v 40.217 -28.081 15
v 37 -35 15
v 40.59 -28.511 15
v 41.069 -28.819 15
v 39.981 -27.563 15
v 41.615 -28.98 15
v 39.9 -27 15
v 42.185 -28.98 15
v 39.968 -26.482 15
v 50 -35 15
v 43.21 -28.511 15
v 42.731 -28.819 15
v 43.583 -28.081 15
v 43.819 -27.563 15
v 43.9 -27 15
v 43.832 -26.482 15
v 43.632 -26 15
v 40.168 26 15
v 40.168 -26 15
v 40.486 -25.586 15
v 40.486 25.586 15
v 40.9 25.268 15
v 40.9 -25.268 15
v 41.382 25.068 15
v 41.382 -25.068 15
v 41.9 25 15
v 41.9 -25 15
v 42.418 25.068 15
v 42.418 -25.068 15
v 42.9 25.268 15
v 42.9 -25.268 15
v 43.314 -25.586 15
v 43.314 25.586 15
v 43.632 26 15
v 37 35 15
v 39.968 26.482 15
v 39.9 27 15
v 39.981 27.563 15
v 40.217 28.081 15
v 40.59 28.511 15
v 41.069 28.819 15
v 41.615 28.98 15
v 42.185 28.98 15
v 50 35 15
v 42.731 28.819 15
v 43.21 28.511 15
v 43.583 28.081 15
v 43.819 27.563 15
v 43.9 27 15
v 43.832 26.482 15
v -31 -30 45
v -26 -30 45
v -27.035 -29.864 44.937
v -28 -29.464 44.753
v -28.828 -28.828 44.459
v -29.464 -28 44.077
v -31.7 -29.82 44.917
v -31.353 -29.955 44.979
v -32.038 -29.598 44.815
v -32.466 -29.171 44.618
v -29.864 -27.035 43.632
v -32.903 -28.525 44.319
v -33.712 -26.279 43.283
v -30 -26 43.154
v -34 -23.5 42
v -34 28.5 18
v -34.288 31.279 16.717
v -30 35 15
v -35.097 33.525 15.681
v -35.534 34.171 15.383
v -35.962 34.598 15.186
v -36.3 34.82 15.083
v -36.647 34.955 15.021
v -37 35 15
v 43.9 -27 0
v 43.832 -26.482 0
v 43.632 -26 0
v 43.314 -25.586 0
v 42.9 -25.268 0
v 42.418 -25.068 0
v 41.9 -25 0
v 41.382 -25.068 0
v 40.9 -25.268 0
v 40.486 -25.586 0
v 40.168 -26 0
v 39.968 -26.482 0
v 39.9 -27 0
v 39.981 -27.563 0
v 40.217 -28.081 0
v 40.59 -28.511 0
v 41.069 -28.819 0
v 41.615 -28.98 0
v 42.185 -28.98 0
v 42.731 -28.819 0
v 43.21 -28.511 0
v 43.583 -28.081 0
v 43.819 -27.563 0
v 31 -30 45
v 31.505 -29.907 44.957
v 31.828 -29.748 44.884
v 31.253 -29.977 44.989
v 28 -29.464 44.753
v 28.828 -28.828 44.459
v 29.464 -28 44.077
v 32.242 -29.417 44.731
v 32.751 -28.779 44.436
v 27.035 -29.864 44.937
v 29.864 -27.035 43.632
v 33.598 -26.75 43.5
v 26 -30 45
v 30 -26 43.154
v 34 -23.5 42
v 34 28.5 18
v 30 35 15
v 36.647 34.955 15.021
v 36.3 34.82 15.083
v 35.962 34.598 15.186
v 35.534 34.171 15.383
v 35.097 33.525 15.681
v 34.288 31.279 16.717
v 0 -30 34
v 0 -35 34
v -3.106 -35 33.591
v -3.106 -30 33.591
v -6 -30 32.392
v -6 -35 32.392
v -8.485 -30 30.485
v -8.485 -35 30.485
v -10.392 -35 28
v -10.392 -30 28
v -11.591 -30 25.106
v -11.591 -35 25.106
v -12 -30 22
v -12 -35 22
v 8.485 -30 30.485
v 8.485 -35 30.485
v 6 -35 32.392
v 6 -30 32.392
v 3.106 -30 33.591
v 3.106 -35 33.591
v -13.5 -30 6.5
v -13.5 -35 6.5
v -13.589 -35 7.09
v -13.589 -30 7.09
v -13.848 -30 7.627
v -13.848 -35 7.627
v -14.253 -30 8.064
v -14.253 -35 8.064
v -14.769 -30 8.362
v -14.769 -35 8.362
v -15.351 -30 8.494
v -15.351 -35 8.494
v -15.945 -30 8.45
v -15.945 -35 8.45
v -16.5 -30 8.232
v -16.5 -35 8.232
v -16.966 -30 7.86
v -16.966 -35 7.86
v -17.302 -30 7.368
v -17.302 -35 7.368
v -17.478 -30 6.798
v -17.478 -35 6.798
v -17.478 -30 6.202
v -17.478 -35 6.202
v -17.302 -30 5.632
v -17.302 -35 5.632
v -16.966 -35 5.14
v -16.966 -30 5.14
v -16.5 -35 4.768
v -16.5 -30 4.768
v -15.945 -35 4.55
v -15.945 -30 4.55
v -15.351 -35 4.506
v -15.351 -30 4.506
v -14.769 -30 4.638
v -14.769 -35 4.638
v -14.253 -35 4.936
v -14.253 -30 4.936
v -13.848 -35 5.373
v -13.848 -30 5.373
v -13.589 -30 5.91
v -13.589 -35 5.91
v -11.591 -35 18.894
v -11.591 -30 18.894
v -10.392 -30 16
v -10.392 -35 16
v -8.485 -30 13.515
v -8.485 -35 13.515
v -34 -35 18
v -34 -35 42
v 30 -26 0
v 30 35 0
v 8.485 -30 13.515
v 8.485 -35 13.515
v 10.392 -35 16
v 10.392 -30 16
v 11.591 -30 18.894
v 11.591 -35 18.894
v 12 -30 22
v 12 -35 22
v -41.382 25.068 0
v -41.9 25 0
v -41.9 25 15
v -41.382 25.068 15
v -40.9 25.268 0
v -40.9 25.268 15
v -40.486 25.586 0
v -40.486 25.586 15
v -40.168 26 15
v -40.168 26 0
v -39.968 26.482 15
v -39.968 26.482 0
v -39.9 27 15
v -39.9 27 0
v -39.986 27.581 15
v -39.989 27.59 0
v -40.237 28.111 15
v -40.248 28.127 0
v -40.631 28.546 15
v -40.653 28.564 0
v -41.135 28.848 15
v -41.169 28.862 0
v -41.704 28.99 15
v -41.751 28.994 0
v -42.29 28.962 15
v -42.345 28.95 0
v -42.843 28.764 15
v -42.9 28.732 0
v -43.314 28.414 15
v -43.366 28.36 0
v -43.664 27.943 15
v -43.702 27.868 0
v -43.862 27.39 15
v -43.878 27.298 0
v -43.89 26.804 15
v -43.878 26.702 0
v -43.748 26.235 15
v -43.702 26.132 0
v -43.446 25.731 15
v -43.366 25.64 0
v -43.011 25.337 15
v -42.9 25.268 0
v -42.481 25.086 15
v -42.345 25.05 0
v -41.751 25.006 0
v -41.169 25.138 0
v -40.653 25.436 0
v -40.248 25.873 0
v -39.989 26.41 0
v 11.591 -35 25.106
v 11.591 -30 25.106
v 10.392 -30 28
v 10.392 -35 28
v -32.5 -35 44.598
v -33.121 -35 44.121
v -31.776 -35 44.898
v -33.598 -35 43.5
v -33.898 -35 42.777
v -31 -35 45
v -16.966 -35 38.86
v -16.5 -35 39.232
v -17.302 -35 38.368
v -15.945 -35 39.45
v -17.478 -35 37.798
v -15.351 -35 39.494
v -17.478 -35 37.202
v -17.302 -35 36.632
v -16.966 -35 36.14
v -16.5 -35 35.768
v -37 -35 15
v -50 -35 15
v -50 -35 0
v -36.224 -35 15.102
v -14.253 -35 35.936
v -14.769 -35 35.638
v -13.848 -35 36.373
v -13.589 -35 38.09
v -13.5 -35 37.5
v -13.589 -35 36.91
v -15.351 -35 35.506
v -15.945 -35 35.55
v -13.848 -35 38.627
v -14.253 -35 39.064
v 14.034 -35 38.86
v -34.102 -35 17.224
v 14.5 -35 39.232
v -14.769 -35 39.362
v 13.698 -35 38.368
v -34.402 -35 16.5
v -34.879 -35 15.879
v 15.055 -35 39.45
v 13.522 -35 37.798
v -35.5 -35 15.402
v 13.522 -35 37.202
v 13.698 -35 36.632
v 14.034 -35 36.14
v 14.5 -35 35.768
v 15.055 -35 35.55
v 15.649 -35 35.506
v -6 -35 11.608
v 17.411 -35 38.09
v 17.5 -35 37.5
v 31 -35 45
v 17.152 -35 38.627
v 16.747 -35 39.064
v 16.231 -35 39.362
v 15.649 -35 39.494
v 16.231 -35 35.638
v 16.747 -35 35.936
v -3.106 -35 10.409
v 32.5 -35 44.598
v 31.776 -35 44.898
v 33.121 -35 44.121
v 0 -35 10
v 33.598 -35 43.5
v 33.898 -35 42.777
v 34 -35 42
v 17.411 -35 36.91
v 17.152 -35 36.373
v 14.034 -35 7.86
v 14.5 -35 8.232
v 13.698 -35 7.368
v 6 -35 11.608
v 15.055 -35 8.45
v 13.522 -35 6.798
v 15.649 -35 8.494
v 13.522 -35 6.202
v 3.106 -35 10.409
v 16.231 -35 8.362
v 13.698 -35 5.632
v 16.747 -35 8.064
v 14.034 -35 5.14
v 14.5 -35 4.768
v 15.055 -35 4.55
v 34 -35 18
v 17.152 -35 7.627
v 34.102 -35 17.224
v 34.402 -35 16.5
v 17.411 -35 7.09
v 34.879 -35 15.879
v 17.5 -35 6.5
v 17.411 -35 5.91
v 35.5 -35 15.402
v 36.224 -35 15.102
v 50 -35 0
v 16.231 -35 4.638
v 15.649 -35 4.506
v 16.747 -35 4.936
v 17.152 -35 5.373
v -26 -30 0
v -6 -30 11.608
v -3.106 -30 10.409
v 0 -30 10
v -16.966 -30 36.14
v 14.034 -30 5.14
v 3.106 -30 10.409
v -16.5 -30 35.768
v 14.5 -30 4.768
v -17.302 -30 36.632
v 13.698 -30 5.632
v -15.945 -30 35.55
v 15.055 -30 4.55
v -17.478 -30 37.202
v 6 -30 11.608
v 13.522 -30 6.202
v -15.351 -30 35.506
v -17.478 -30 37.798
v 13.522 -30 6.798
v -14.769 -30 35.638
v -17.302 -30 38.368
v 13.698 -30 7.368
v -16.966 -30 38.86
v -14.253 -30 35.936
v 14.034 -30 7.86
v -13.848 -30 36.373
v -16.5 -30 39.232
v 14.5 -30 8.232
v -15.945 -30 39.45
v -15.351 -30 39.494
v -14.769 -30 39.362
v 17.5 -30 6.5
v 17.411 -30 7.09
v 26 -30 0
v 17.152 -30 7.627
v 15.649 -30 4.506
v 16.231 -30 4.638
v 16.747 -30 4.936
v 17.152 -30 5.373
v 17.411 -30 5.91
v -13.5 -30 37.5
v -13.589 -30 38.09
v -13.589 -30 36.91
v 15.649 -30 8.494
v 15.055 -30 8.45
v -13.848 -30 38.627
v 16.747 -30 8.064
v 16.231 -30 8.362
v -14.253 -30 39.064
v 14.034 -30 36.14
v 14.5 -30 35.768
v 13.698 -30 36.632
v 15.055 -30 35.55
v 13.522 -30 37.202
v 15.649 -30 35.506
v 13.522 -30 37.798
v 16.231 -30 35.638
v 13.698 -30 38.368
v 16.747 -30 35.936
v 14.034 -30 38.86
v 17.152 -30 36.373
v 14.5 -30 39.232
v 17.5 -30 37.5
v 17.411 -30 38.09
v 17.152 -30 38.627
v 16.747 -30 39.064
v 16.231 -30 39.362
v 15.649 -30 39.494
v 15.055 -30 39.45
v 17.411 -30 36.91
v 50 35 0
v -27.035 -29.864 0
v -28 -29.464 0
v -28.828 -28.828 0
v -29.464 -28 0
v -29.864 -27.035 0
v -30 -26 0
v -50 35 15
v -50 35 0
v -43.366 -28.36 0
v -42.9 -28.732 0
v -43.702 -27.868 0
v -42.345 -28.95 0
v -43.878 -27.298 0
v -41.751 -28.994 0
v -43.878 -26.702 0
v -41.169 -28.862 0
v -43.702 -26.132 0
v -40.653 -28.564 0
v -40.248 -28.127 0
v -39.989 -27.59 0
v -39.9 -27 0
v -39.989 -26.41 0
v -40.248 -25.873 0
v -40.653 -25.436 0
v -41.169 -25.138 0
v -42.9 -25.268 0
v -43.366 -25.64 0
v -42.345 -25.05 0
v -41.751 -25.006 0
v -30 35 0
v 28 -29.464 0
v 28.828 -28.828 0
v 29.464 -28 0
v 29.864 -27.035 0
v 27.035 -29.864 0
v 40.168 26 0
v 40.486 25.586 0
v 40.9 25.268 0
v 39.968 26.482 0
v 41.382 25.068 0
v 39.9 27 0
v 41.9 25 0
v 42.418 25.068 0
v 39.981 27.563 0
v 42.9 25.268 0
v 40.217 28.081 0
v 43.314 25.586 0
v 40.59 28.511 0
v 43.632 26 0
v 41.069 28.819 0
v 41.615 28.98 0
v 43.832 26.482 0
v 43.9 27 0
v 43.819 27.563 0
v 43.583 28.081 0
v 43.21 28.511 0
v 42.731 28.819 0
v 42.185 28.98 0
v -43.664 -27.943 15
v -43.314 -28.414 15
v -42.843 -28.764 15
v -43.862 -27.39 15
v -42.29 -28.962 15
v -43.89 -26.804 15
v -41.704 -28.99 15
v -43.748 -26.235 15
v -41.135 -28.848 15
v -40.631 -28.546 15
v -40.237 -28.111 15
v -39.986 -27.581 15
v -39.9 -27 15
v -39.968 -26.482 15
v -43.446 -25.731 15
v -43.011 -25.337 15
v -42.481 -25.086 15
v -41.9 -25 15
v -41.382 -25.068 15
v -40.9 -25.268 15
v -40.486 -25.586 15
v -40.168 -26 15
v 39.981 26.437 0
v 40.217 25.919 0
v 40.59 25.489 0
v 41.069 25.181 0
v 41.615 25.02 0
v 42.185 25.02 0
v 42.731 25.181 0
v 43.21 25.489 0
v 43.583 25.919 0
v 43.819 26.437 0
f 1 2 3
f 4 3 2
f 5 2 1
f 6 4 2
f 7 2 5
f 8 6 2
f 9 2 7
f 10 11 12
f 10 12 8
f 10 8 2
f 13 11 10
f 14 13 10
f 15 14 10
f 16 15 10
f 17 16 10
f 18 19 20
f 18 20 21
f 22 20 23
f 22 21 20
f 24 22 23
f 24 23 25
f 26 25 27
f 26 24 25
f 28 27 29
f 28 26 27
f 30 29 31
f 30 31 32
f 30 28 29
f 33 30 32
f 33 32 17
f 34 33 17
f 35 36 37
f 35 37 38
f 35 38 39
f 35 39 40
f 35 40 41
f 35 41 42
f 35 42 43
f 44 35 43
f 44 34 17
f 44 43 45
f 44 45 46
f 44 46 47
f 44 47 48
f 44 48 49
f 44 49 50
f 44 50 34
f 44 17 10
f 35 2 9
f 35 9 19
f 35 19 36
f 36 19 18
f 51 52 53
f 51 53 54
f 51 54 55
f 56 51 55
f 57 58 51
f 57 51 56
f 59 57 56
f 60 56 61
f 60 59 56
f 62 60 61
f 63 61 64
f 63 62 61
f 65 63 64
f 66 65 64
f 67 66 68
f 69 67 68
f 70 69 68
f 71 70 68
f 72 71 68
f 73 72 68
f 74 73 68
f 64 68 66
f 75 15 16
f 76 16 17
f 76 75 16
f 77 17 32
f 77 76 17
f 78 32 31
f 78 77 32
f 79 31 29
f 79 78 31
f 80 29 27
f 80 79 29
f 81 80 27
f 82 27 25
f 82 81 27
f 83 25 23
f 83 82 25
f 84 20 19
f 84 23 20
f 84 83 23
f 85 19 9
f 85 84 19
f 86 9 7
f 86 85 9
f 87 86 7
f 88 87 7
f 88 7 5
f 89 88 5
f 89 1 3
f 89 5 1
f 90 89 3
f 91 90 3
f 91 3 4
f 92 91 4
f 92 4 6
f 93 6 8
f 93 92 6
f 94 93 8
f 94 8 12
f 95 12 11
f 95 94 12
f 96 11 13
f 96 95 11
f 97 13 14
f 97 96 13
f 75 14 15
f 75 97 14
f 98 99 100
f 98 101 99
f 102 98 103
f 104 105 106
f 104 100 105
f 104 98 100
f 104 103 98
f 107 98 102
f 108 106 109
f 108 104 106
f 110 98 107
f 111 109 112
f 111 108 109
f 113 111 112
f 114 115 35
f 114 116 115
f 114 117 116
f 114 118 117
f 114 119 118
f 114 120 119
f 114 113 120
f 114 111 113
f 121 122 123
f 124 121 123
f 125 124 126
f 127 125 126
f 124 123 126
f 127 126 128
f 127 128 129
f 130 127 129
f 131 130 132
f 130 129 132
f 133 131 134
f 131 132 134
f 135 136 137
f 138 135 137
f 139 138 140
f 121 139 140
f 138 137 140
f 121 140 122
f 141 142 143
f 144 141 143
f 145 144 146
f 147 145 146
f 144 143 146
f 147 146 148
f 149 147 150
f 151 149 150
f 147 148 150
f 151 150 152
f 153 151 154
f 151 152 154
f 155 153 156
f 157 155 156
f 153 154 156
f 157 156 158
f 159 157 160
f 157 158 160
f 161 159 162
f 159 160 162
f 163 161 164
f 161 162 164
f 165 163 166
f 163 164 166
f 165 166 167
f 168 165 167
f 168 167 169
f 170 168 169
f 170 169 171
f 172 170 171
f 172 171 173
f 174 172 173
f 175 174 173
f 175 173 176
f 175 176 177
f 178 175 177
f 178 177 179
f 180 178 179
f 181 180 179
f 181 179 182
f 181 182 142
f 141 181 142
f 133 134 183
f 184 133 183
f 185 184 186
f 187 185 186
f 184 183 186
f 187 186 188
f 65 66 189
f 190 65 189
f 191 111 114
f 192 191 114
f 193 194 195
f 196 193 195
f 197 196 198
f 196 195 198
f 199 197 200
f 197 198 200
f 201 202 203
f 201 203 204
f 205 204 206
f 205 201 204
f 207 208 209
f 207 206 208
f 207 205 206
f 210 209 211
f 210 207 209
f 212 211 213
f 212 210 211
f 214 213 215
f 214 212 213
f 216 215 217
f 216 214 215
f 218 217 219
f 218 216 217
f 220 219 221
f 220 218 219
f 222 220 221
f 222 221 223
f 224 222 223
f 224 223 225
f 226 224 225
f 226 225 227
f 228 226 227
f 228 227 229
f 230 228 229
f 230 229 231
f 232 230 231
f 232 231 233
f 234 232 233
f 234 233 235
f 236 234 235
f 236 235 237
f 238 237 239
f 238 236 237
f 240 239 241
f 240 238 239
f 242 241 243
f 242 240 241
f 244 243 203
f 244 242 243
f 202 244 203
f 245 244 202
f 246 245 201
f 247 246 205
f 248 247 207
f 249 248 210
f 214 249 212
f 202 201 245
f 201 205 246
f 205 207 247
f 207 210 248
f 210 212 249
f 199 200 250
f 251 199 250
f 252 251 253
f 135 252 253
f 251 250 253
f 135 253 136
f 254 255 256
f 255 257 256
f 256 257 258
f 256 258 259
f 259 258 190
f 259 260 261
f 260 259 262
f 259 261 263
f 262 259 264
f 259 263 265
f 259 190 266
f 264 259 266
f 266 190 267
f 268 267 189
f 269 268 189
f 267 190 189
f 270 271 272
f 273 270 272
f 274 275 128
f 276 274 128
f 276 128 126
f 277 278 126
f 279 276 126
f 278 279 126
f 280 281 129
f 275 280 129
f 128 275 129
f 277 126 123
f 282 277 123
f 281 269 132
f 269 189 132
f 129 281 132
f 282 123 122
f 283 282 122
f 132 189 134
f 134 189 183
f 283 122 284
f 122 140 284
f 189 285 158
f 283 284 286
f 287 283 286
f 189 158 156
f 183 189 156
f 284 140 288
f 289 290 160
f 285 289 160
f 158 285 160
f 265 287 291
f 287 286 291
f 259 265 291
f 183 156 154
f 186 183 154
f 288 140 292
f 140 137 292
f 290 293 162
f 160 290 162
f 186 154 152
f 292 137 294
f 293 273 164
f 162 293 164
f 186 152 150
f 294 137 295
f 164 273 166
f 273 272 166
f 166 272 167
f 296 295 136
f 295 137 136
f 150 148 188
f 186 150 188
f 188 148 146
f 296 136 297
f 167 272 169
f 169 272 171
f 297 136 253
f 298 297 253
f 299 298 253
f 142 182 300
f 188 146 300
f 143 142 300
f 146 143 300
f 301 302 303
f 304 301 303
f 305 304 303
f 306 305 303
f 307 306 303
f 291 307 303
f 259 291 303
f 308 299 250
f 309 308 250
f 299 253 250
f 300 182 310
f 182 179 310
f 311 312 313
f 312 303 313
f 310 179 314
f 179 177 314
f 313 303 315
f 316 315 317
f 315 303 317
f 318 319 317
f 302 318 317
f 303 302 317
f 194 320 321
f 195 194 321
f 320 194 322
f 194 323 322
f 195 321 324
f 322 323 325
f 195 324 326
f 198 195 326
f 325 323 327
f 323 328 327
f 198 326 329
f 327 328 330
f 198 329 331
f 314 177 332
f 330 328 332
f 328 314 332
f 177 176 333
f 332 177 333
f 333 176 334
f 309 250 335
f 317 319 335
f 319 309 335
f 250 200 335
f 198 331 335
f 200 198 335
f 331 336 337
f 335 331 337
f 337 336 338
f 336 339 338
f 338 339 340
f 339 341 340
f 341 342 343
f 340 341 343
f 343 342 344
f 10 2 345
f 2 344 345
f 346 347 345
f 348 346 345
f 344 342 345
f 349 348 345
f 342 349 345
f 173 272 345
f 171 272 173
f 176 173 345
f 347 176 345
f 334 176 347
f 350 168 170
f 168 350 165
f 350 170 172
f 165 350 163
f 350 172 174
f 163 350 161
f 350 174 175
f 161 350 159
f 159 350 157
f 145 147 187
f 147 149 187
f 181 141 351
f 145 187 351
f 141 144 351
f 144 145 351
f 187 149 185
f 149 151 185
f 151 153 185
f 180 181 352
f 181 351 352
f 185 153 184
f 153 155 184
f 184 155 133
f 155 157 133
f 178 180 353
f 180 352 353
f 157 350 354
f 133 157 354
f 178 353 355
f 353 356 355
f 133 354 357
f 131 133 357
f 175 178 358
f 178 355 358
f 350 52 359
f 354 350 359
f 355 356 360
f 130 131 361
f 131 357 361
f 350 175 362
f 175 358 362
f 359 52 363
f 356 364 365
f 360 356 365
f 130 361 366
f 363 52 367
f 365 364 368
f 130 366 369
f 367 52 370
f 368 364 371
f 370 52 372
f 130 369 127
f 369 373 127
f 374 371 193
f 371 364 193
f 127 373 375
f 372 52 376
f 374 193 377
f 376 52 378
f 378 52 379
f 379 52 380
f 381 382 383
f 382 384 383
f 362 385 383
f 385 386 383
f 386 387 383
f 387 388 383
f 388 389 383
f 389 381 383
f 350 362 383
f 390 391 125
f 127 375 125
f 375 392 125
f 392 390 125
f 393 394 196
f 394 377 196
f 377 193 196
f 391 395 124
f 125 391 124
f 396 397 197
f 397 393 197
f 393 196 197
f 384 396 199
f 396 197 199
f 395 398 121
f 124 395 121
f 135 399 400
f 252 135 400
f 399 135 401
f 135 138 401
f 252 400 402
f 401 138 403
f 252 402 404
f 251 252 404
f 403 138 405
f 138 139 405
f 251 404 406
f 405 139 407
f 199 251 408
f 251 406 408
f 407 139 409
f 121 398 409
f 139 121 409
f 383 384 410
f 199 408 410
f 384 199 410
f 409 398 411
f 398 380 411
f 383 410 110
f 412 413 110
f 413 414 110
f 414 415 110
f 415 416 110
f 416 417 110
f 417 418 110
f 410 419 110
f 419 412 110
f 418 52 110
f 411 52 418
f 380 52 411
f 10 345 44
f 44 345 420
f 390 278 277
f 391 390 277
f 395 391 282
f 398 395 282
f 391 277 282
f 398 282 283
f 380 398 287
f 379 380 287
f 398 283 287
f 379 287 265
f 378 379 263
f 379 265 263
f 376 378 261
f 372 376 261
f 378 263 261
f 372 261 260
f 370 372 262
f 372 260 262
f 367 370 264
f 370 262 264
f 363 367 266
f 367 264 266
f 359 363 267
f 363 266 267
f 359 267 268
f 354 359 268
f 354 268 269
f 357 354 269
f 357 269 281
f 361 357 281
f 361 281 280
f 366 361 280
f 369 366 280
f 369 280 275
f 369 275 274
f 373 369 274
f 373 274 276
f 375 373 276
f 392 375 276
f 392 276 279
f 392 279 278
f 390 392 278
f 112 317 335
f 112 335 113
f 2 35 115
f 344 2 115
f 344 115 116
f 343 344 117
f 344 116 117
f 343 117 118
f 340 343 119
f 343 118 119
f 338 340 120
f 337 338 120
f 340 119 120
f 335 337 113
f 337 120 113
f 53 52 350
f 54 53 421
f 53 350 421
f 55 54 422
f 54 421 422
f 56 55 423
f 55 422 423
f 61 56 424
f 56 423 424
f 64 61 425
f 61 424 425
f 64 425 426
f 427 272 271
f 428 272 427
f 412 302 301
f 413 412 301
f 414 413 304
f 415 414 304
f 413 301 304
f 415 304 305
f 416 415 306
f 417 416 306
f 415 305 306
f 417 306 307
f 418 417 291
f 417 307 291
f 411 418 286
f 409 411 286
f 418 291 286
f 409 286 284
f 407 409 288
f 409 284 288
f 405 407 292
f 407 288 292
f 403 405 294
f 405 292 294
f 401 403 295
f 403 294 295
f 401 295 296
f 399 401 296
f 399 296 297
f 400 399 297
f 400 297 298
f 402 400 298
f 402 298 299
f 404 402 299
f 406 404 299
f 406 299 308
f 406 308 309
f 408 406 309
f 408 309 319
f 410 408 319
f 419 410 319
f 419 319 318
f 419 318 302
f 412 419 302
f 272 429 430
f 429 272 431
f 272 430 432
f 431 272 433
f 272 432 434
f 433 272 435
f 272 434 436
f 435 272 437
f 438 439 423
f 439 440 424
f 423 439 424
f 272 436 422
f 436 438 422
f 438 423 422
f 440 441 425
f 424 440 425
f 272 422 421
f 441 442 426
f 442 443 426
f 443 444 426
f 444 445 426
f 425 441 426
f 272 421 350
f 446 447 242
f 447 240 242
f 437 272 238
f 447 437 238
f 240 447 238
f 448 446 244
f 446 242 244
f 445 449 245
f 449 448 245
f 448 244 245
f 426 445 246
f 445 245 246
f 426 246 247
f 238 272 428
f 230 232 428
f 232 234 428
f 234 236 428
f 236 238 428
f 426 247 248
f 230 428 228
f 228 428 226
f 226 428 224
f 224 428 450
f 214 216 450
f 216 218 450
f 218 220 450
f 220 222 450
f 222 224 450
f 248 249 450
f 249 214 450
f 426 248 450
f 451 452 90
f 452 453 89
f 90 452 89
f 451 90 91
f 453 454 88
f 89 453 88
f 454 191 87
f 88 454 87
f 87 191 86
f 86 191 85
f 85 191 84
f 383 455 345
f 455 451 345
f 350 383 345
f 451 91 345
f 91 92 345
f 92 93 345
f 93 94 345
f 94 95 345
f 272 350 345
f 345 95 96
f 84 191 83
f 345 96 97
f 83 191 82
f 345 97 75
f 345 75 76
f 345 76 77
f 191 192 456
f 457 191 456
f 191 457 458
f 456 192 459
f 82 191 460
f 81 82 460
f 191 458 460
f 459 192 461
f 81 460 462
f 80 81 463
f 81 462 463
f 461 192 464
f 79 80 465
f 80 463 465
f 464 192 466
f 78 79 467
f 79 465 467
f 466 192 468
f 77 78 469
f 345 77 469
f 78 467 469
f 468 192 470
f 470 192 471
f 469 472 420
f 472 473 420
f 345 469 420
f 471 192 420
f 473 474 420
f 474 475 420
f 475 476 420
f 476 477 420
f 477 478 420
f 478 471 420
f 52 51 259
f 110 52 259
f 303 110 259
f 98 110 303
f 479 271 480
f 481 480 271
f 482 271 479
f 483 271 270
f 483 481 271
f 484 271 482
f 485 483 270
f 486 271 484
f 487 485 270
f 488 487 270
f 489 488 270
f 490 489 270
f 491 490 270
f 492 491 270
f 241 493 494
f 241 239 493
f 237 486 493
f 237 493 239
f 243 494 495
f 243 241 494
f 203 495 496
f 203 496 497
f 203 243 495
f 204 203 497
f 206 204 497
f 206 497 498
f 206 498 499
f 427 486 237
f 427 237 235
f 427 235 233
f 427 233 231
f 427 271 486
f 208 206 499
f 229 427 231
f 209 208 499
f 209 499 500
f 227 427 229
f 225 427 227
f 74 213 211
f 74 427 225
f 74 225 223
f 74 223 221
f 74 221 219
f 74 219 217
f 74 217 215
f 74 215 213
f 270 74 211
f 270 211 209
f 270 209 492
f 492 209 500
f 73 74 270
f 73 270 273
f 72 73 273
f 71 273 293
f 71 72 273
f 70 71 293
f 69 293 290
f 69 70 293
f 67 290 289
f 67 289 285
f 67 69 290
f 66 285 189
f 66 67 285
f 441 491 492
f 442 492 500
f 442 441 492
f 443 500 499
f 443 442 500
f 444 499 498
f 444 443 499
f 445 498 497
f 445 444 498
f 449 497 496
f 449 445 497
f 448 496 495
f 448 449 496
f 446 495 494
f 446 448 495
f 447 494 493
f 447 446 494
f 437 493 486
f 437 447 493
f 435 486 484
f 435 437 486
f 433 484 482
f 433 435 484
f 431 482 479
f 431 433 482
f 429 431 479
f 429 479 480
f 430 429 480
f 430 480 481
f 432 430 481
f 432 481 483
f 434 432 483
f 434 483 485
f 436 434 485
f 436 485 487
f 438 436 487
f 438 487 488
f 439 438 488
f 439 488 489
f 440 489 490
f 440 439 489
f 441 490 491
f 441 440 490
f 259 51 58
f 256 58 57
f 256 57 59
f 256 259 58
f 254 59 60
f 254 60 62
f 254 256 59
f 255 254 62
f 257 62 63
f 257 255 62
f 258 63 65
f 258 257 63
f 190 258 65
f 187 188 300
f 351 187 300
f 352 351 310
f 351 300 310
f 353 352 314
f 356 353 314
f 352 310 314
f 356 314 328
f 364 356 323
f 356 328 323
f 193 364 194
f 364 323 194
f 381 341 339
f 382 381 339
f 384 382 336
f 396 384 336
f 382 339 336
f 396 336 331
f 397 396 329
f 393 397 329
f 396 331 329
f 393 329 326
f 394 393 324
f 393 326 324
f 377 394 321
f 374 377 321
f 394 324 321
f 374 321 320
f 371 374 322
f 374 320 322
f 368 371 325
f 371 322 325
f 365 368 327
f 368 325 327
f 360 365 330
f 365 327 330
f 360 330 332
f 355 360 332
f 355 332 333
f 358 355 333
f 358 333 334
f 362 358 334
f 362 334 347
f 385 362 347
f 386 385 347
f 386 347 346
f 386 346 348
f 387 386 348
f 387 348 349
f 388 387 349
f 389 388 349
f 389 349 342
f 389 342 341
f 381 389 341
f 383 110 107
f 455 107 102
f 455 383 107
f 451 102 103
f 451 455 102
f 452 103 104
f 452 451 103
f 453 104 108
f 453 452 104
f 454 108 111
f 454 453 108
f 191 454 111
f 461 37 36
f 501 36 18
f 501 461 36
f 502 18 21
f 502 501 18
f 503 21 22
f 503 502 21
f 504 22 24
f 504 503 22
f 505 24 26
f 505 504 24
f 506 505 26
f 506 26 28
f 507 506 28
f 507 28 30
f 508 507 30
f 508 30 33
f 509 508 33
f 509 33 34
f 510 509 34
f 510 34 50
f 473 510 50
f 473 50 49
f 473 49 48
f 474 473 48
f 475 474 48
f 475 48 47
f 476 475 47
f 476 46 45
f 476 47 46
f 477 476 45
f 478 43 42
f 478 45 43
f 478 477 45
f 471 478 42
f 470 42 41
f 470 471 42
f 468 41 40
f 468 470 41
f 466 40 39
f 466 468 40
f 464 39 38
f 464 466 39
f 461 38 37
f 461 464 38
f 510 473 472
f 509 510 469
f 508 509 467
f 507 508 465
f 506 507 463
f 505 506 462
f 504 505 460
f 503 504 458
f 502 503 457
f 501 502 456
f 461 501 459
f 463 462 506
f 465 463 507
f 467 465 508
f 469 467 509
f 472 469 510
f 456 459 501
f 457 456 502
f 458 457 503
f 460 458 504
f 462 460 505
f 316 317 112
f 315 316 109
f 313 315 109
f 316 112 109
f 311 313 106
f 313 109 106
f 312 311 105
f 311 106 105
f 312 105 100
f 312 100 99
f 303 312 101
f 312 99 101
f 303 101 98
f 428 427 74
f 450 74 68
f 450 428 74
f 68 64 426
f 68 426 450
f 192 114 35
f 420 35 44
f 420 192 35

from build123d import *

# Parameters (mm, degrees)
SKETCH_5_W          = 100
SKETCH_5_H          = 70
SKETCH_5_R          = 2
EXTRUDE_10_DEPTH    = 0.0001
SKETCH_6_W          = 60
SKETCH_6_H          = 5
EXTRUDE_11_DEPTH    = 45
SKETCH_7_W          = 4
SKETCH_7_H          = 70
EXTRUDE_12_DEPTH    = 45
CUT_EXTRUDE_1_DEPTH = 76
SKETCH_16_W         = 16
SKETCH_16_H         = 70
EXTRUDE_16_DEPTH    = 15
SKETCH_5_3_R        = 2
CUT_EXTRUDE_2_DEPTH = 49
SKETCH_17_R         = 2
SKETCH_17_R_2       = 12
CUT_EXTRUDE_5_DEPTH = 98.082485547
FILLET_1_R          = 3
SKETCH_18_W         = 60
SKETCH_18_H         = 65
CUT_EXTRUDE_6_DEPTH = 76.828754441
FILLET_2_R          = 4


with BuildPart() as part:
    # 草图5 → 凸台-拉伸10 (new body)
    with BuildSketch(Plane.XY):
        Rectangle(SKETCH_5_W, SKETCH_5_H)
        with Locations((-41.9, 27)):
            Circle(SKETCH_5_R, mode=Mode.SUBTRACT)
        with Locations((-41.9, -27)):
            Circle(SKETCH_5_R, mode=Mode.SUBTRACT)
        with Locations((41.9, -27)):
            Circle(SKETCH_5_R, mode=Mode.SUBTRACT)
        with Locations((41.9, 27)):
            Circle(SKETCH_5_R, mode=Mode.SUBTRACT)
    extrude(amount=EXTRUDE_10_DEPTH)

    # 草图6 → 凸台-拉伸11 (add)
    with BuildSketch(Plane.XY.offset(0.0001)):
        with Locations((0, -32.5)):
            Rectangle(SKETCH_6_W, SKETCH_6_H)
    extrude(amount=EXTRUDE_11_DEPTH)

    # 草图7 → 凸台-拉伸12 (add)
    with BuildSketch(Plane.XY.offset(0.0001)):
        with Locations((-32, 0)):
            Rectangle(SKETCH_7_W, SKETCH_7_H)
        with Locations((32, 0)):
            Rectangle(SKETCH_7_W, SKETCH_7_H)
    extrude(amount=EXTRUDE_12_DEPTH)

    # 草图8 → 切除-拉伸1 (cut)
    with BuildSketch(Plane.ZY.offset(34)):
        Polygon((45.0001, -30), (15.0001, 35), (45.0001, 35), align=None)
    extrude(amount=-CUT_EXTRUDE_1_DEPTH, mode=Mode.SUBTRACT)

    # 草图16 → 凸台-拉伸16 (add)
    with BuildSketch(Plane.XY.offset(0.0001)):
        with Locations((42, 0)):
            Rectangle(SKETCH_16_W, SKETCH_16_H)
        with Locations((-42, 0)):
            Rectangle(SKETCH_16_W, SKETCH_16_H)
    extrude(amount=EXTRUDE_16_DEPTH)

    # 草图5<3> → 切除-拉伸2 (cut)
    with BuildSketch(Plane.XY):
        with Locations((-41.9, 27)):
            Circle(SKETCH_5_3_R)
        with Locations((-41.9, -27)):
            Circle(SKETCH_5_3_R)
        with Locations((41.9, 27)):
            Circle(SKETCH_5_3_R)
        with Locations((41.9, -27)):
            Circle(SKETCH_5_3_R)
    extrude(amount=CUT_EXTRUDE_2_DEPTH, mode=Mode.SUBTRACT)

    # 草图17 → 切除-拉伸5 (cut, through all)
    with BuildSketch(Plane.XZ.offset(35)):
        with Locations((-15.5, 37.5)):
            Circle(SKETCH_17_R)
        with Locations((0, 22)):
            Circle(SKETCH_17_R_2)
        with Locations((15.5, 37.5)):
            Circle(SKETCH_17_R)
        with Locations((-15.5, 6.5)):
            Circle(SKETCH_17_R)
        with Locations((15.5, 6.5)):
            Circle(SKETCH_17_R)
    extrude(amount=-CUT_EXTRUDE_5_DEPTH, mode=Mode.SUBTRACT)

    # 圆角1
    fillet_1_edges = [part.edges().sort_by_distance(p)[0] for p in [
        (34, 0, 15.0001),
        (-34, 0, 15.0001),
        (-34, -32.5, 45.0001),
        (34, -32.5, 45.0001),
    ]]
    fillet(fillet_1_edges, radius=FILLET_1_R)

    # 草图18 → 切除-拉伸6 (cut, through all)
    with BuildSketch(Plane.XY.offset(0.0001)):
        with Locations((0, 2.5)):
            Rectangle(SKETCH_18_W, SKETCH_18_H)
    extrude(amount=-CUT_EXTRUDE_6_DEPTH, mode=Mode.SUBTRACT)

    # 圆角2
    fillet_2_edges = [part.edges().sort_by_distance(p)[0] for p in [
        (-30, -30, 22.50005),
        (30, -30, 22.50005),
    ]]
    fillet(fillet_2_edges, radius=FILLET_2_R)


solid = part.part
